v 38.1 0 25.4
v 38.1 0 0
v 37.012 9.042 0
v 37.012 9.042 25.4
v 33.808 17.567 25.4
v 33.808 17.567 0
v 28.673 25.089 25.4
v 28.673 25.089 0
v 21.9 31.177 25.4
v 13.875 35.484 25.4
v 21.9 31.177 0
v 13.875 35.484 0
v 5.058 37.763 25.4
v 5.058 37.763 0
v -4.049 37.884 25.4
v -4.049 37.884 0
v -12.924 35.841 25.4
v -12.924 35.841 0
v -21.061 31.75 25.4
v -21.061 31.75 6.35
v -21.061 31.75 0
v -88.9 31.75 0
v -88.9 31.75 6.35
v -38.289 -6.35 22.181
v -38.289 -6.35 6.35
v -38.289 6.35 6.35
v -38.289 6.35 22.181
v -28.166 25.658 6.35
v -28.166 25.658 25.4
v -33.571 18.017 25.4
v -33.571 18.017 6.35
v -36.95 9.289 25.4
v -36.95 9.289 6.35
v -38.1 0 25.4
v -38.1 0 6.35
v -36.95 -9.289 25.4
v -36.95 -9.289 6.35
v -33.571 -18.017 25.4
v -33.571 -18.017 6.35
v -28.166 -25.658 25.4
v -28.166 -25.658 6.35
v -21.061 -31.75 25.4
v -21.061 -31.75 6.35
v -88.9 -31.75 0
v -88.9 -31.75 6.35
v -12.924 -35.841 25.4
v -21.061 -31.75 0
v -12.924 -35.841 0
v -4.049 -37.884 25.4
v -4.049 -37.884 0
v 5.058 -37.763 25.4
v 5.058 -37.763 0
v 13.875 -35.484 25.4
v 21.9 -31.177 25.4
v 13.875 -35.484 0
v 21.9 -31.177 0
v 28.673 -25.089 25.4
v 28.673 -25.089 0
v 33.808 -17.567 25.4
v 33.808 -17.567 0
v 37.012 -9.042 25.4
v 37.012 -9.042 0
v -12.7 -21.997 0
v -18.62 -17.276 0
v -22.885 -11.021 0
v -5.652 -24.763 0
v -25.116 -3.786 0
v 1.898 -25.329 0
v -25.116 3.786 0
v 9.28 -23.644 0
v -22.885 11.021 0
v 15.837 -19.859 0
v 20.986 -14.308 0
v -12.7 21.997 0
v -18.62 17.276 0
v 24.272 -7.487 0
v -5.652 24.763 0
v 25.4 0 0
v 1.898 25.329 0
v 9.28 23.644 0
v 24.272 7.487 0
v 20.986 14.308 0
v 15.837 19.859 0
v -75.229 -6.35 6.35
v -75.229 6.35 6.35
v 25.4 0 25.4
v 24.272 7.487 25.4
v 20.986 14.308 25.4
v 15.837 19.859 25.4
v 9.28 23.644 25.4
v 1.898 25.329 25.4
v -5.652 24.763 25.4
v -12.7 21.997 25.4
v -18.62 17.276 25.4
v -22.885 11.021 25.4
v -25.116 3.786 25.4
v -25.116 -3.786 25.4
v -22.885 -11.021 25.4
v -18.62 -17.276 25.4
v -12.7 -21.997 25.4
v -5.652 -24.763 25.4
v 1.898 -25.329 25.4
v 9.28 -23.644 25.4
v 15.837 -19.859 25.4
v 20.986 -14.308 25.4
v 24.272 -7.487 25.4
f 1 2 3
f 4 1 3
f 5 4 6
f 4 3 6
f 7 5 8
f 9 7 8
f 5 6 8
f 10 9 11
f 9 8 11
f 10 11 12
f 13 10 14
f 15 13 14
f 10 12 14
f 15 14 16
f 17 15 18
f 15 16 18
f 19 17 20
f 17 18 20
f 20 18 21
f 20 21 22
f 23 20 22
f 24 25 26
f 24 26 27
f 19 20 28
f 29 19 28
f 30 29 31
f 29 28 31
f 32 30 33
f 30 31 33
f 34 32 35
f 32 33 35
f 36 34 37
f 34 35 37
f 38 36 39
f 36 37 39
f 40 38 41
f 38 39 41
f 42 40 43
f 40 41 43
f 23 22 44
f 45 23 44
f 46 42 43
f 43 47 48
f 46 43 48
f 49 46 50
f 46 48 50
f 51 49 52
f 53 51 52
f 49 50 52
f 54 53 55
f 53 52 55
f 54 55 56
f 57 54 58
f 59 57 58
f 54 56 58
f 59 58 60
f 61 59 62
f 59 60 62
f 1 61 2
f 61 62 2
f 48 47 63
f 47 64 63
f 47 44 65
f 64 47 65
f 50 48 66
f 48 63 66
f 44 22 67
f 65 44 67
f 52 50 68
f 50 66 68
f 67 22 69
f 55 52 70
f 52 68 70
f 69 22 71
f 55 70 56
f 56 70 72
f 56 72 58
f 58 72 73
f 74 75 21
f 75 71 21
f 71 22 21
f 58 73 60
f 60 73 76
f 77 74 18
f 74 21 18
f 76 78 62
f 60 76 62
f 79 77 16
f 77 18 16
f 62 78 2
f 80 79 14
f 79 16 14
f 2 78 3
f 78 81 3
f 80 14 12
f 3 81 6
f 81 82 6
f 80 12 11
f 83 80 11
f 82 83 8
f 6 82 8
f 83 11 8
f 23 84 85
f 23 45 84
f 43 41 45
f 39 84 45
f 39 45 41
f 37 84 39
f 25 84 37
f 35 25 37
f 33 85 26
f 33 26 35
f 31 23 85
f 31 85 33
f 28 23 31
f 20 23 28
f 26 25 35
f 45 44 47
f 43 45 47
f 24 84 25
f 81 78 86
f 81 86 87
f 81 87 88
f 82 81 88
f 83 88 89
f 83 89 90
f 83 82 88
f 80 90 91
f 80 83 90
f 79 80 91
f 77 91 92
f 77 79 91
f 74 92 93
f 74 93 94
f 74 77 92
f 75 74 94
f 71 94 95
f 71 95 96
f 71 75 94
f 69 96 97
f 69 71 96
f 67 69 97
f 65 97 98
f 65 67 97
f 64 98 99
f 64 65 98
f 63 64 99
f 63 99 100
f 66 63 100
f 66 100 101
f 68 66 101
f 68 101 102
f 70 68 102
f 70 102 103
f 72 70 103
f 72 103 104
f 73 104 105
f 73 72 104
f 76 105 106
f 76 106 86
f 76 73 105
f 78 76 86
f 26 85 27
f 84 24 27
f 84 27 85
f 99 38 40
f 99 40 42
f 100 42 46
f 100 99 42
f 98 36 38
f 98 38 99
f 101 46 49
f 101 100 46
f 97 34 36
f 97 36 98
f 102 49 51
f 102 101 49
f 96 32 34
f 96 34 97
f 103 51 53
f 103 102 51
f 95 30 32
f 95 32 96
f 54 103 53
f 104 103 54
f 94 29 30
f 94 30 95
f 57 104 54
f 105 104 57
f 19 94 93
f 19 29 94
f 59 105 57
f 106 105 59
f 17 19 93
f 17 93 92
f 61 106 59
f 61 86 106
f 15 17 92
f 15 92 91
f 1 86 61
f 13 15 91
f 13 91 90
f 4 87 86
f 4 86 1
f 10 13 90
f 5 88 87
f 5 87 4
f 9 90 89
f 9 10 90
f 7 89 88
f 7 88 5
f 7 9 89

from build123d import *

# Parameters (mm, degrees)
F1_DEPTH      = 6.35
F0_R          = 25.4
F2_DEPTH      = 25.4
F4_DEPTH      = 6.35
F4_DEPTH_BACK = 6.35


with BuildPart() as f1:
    # F0 (on Top) → F1 (new body)
    with BuildSketch(Plane.XY):
        with BuildLine():
            ThreePointArc((-21.060567, -31.75), (-38.1, 0), (-21.060567, 31.75))
            Line((-21.060567, 31.75), (-88.9, 31.75))
            Line((-88.9, 31.75), (-88.9, -31.75))
            Line((-88.9, -31.75), (-21.060567, -31.75))
        make_face()
    extrude(amount=F1_DEPTH)

    # F0 (on Top) → F2 (join)
    with BuildSketch(Plane.XY):
        with BuildLine():
            ThreePointArc((-21.060567, -31.75), (18.016692, -33.570952), (38.1, 0))
            ThreePointArc((38.1, 0), (18.016692, 33.570952), (-21.060567, 31.75))
            ThreePointArc((-21.060567, 31.75), (-38.1, 0), (-21.060567, -31.75))
        make_face()
        Circle(F0_R, mode=Mode.SUBTRACT)
    extrude(amount=F2_DEPTH)

    # F3 (on Front) → F4 (join, two sides)
    with BuildSketch(Plane.XZ) as f4_sk:
        Polygon((-82.73942, 3.131038), (-38.28942, 3.131038), (-38.28942, 22.181038), align=None)
    extrude(amount=F4_DEPTH)
    extrude(f4_sk.sketch, amount=-F4_DEPTH_BACK)


solid = f1.part
